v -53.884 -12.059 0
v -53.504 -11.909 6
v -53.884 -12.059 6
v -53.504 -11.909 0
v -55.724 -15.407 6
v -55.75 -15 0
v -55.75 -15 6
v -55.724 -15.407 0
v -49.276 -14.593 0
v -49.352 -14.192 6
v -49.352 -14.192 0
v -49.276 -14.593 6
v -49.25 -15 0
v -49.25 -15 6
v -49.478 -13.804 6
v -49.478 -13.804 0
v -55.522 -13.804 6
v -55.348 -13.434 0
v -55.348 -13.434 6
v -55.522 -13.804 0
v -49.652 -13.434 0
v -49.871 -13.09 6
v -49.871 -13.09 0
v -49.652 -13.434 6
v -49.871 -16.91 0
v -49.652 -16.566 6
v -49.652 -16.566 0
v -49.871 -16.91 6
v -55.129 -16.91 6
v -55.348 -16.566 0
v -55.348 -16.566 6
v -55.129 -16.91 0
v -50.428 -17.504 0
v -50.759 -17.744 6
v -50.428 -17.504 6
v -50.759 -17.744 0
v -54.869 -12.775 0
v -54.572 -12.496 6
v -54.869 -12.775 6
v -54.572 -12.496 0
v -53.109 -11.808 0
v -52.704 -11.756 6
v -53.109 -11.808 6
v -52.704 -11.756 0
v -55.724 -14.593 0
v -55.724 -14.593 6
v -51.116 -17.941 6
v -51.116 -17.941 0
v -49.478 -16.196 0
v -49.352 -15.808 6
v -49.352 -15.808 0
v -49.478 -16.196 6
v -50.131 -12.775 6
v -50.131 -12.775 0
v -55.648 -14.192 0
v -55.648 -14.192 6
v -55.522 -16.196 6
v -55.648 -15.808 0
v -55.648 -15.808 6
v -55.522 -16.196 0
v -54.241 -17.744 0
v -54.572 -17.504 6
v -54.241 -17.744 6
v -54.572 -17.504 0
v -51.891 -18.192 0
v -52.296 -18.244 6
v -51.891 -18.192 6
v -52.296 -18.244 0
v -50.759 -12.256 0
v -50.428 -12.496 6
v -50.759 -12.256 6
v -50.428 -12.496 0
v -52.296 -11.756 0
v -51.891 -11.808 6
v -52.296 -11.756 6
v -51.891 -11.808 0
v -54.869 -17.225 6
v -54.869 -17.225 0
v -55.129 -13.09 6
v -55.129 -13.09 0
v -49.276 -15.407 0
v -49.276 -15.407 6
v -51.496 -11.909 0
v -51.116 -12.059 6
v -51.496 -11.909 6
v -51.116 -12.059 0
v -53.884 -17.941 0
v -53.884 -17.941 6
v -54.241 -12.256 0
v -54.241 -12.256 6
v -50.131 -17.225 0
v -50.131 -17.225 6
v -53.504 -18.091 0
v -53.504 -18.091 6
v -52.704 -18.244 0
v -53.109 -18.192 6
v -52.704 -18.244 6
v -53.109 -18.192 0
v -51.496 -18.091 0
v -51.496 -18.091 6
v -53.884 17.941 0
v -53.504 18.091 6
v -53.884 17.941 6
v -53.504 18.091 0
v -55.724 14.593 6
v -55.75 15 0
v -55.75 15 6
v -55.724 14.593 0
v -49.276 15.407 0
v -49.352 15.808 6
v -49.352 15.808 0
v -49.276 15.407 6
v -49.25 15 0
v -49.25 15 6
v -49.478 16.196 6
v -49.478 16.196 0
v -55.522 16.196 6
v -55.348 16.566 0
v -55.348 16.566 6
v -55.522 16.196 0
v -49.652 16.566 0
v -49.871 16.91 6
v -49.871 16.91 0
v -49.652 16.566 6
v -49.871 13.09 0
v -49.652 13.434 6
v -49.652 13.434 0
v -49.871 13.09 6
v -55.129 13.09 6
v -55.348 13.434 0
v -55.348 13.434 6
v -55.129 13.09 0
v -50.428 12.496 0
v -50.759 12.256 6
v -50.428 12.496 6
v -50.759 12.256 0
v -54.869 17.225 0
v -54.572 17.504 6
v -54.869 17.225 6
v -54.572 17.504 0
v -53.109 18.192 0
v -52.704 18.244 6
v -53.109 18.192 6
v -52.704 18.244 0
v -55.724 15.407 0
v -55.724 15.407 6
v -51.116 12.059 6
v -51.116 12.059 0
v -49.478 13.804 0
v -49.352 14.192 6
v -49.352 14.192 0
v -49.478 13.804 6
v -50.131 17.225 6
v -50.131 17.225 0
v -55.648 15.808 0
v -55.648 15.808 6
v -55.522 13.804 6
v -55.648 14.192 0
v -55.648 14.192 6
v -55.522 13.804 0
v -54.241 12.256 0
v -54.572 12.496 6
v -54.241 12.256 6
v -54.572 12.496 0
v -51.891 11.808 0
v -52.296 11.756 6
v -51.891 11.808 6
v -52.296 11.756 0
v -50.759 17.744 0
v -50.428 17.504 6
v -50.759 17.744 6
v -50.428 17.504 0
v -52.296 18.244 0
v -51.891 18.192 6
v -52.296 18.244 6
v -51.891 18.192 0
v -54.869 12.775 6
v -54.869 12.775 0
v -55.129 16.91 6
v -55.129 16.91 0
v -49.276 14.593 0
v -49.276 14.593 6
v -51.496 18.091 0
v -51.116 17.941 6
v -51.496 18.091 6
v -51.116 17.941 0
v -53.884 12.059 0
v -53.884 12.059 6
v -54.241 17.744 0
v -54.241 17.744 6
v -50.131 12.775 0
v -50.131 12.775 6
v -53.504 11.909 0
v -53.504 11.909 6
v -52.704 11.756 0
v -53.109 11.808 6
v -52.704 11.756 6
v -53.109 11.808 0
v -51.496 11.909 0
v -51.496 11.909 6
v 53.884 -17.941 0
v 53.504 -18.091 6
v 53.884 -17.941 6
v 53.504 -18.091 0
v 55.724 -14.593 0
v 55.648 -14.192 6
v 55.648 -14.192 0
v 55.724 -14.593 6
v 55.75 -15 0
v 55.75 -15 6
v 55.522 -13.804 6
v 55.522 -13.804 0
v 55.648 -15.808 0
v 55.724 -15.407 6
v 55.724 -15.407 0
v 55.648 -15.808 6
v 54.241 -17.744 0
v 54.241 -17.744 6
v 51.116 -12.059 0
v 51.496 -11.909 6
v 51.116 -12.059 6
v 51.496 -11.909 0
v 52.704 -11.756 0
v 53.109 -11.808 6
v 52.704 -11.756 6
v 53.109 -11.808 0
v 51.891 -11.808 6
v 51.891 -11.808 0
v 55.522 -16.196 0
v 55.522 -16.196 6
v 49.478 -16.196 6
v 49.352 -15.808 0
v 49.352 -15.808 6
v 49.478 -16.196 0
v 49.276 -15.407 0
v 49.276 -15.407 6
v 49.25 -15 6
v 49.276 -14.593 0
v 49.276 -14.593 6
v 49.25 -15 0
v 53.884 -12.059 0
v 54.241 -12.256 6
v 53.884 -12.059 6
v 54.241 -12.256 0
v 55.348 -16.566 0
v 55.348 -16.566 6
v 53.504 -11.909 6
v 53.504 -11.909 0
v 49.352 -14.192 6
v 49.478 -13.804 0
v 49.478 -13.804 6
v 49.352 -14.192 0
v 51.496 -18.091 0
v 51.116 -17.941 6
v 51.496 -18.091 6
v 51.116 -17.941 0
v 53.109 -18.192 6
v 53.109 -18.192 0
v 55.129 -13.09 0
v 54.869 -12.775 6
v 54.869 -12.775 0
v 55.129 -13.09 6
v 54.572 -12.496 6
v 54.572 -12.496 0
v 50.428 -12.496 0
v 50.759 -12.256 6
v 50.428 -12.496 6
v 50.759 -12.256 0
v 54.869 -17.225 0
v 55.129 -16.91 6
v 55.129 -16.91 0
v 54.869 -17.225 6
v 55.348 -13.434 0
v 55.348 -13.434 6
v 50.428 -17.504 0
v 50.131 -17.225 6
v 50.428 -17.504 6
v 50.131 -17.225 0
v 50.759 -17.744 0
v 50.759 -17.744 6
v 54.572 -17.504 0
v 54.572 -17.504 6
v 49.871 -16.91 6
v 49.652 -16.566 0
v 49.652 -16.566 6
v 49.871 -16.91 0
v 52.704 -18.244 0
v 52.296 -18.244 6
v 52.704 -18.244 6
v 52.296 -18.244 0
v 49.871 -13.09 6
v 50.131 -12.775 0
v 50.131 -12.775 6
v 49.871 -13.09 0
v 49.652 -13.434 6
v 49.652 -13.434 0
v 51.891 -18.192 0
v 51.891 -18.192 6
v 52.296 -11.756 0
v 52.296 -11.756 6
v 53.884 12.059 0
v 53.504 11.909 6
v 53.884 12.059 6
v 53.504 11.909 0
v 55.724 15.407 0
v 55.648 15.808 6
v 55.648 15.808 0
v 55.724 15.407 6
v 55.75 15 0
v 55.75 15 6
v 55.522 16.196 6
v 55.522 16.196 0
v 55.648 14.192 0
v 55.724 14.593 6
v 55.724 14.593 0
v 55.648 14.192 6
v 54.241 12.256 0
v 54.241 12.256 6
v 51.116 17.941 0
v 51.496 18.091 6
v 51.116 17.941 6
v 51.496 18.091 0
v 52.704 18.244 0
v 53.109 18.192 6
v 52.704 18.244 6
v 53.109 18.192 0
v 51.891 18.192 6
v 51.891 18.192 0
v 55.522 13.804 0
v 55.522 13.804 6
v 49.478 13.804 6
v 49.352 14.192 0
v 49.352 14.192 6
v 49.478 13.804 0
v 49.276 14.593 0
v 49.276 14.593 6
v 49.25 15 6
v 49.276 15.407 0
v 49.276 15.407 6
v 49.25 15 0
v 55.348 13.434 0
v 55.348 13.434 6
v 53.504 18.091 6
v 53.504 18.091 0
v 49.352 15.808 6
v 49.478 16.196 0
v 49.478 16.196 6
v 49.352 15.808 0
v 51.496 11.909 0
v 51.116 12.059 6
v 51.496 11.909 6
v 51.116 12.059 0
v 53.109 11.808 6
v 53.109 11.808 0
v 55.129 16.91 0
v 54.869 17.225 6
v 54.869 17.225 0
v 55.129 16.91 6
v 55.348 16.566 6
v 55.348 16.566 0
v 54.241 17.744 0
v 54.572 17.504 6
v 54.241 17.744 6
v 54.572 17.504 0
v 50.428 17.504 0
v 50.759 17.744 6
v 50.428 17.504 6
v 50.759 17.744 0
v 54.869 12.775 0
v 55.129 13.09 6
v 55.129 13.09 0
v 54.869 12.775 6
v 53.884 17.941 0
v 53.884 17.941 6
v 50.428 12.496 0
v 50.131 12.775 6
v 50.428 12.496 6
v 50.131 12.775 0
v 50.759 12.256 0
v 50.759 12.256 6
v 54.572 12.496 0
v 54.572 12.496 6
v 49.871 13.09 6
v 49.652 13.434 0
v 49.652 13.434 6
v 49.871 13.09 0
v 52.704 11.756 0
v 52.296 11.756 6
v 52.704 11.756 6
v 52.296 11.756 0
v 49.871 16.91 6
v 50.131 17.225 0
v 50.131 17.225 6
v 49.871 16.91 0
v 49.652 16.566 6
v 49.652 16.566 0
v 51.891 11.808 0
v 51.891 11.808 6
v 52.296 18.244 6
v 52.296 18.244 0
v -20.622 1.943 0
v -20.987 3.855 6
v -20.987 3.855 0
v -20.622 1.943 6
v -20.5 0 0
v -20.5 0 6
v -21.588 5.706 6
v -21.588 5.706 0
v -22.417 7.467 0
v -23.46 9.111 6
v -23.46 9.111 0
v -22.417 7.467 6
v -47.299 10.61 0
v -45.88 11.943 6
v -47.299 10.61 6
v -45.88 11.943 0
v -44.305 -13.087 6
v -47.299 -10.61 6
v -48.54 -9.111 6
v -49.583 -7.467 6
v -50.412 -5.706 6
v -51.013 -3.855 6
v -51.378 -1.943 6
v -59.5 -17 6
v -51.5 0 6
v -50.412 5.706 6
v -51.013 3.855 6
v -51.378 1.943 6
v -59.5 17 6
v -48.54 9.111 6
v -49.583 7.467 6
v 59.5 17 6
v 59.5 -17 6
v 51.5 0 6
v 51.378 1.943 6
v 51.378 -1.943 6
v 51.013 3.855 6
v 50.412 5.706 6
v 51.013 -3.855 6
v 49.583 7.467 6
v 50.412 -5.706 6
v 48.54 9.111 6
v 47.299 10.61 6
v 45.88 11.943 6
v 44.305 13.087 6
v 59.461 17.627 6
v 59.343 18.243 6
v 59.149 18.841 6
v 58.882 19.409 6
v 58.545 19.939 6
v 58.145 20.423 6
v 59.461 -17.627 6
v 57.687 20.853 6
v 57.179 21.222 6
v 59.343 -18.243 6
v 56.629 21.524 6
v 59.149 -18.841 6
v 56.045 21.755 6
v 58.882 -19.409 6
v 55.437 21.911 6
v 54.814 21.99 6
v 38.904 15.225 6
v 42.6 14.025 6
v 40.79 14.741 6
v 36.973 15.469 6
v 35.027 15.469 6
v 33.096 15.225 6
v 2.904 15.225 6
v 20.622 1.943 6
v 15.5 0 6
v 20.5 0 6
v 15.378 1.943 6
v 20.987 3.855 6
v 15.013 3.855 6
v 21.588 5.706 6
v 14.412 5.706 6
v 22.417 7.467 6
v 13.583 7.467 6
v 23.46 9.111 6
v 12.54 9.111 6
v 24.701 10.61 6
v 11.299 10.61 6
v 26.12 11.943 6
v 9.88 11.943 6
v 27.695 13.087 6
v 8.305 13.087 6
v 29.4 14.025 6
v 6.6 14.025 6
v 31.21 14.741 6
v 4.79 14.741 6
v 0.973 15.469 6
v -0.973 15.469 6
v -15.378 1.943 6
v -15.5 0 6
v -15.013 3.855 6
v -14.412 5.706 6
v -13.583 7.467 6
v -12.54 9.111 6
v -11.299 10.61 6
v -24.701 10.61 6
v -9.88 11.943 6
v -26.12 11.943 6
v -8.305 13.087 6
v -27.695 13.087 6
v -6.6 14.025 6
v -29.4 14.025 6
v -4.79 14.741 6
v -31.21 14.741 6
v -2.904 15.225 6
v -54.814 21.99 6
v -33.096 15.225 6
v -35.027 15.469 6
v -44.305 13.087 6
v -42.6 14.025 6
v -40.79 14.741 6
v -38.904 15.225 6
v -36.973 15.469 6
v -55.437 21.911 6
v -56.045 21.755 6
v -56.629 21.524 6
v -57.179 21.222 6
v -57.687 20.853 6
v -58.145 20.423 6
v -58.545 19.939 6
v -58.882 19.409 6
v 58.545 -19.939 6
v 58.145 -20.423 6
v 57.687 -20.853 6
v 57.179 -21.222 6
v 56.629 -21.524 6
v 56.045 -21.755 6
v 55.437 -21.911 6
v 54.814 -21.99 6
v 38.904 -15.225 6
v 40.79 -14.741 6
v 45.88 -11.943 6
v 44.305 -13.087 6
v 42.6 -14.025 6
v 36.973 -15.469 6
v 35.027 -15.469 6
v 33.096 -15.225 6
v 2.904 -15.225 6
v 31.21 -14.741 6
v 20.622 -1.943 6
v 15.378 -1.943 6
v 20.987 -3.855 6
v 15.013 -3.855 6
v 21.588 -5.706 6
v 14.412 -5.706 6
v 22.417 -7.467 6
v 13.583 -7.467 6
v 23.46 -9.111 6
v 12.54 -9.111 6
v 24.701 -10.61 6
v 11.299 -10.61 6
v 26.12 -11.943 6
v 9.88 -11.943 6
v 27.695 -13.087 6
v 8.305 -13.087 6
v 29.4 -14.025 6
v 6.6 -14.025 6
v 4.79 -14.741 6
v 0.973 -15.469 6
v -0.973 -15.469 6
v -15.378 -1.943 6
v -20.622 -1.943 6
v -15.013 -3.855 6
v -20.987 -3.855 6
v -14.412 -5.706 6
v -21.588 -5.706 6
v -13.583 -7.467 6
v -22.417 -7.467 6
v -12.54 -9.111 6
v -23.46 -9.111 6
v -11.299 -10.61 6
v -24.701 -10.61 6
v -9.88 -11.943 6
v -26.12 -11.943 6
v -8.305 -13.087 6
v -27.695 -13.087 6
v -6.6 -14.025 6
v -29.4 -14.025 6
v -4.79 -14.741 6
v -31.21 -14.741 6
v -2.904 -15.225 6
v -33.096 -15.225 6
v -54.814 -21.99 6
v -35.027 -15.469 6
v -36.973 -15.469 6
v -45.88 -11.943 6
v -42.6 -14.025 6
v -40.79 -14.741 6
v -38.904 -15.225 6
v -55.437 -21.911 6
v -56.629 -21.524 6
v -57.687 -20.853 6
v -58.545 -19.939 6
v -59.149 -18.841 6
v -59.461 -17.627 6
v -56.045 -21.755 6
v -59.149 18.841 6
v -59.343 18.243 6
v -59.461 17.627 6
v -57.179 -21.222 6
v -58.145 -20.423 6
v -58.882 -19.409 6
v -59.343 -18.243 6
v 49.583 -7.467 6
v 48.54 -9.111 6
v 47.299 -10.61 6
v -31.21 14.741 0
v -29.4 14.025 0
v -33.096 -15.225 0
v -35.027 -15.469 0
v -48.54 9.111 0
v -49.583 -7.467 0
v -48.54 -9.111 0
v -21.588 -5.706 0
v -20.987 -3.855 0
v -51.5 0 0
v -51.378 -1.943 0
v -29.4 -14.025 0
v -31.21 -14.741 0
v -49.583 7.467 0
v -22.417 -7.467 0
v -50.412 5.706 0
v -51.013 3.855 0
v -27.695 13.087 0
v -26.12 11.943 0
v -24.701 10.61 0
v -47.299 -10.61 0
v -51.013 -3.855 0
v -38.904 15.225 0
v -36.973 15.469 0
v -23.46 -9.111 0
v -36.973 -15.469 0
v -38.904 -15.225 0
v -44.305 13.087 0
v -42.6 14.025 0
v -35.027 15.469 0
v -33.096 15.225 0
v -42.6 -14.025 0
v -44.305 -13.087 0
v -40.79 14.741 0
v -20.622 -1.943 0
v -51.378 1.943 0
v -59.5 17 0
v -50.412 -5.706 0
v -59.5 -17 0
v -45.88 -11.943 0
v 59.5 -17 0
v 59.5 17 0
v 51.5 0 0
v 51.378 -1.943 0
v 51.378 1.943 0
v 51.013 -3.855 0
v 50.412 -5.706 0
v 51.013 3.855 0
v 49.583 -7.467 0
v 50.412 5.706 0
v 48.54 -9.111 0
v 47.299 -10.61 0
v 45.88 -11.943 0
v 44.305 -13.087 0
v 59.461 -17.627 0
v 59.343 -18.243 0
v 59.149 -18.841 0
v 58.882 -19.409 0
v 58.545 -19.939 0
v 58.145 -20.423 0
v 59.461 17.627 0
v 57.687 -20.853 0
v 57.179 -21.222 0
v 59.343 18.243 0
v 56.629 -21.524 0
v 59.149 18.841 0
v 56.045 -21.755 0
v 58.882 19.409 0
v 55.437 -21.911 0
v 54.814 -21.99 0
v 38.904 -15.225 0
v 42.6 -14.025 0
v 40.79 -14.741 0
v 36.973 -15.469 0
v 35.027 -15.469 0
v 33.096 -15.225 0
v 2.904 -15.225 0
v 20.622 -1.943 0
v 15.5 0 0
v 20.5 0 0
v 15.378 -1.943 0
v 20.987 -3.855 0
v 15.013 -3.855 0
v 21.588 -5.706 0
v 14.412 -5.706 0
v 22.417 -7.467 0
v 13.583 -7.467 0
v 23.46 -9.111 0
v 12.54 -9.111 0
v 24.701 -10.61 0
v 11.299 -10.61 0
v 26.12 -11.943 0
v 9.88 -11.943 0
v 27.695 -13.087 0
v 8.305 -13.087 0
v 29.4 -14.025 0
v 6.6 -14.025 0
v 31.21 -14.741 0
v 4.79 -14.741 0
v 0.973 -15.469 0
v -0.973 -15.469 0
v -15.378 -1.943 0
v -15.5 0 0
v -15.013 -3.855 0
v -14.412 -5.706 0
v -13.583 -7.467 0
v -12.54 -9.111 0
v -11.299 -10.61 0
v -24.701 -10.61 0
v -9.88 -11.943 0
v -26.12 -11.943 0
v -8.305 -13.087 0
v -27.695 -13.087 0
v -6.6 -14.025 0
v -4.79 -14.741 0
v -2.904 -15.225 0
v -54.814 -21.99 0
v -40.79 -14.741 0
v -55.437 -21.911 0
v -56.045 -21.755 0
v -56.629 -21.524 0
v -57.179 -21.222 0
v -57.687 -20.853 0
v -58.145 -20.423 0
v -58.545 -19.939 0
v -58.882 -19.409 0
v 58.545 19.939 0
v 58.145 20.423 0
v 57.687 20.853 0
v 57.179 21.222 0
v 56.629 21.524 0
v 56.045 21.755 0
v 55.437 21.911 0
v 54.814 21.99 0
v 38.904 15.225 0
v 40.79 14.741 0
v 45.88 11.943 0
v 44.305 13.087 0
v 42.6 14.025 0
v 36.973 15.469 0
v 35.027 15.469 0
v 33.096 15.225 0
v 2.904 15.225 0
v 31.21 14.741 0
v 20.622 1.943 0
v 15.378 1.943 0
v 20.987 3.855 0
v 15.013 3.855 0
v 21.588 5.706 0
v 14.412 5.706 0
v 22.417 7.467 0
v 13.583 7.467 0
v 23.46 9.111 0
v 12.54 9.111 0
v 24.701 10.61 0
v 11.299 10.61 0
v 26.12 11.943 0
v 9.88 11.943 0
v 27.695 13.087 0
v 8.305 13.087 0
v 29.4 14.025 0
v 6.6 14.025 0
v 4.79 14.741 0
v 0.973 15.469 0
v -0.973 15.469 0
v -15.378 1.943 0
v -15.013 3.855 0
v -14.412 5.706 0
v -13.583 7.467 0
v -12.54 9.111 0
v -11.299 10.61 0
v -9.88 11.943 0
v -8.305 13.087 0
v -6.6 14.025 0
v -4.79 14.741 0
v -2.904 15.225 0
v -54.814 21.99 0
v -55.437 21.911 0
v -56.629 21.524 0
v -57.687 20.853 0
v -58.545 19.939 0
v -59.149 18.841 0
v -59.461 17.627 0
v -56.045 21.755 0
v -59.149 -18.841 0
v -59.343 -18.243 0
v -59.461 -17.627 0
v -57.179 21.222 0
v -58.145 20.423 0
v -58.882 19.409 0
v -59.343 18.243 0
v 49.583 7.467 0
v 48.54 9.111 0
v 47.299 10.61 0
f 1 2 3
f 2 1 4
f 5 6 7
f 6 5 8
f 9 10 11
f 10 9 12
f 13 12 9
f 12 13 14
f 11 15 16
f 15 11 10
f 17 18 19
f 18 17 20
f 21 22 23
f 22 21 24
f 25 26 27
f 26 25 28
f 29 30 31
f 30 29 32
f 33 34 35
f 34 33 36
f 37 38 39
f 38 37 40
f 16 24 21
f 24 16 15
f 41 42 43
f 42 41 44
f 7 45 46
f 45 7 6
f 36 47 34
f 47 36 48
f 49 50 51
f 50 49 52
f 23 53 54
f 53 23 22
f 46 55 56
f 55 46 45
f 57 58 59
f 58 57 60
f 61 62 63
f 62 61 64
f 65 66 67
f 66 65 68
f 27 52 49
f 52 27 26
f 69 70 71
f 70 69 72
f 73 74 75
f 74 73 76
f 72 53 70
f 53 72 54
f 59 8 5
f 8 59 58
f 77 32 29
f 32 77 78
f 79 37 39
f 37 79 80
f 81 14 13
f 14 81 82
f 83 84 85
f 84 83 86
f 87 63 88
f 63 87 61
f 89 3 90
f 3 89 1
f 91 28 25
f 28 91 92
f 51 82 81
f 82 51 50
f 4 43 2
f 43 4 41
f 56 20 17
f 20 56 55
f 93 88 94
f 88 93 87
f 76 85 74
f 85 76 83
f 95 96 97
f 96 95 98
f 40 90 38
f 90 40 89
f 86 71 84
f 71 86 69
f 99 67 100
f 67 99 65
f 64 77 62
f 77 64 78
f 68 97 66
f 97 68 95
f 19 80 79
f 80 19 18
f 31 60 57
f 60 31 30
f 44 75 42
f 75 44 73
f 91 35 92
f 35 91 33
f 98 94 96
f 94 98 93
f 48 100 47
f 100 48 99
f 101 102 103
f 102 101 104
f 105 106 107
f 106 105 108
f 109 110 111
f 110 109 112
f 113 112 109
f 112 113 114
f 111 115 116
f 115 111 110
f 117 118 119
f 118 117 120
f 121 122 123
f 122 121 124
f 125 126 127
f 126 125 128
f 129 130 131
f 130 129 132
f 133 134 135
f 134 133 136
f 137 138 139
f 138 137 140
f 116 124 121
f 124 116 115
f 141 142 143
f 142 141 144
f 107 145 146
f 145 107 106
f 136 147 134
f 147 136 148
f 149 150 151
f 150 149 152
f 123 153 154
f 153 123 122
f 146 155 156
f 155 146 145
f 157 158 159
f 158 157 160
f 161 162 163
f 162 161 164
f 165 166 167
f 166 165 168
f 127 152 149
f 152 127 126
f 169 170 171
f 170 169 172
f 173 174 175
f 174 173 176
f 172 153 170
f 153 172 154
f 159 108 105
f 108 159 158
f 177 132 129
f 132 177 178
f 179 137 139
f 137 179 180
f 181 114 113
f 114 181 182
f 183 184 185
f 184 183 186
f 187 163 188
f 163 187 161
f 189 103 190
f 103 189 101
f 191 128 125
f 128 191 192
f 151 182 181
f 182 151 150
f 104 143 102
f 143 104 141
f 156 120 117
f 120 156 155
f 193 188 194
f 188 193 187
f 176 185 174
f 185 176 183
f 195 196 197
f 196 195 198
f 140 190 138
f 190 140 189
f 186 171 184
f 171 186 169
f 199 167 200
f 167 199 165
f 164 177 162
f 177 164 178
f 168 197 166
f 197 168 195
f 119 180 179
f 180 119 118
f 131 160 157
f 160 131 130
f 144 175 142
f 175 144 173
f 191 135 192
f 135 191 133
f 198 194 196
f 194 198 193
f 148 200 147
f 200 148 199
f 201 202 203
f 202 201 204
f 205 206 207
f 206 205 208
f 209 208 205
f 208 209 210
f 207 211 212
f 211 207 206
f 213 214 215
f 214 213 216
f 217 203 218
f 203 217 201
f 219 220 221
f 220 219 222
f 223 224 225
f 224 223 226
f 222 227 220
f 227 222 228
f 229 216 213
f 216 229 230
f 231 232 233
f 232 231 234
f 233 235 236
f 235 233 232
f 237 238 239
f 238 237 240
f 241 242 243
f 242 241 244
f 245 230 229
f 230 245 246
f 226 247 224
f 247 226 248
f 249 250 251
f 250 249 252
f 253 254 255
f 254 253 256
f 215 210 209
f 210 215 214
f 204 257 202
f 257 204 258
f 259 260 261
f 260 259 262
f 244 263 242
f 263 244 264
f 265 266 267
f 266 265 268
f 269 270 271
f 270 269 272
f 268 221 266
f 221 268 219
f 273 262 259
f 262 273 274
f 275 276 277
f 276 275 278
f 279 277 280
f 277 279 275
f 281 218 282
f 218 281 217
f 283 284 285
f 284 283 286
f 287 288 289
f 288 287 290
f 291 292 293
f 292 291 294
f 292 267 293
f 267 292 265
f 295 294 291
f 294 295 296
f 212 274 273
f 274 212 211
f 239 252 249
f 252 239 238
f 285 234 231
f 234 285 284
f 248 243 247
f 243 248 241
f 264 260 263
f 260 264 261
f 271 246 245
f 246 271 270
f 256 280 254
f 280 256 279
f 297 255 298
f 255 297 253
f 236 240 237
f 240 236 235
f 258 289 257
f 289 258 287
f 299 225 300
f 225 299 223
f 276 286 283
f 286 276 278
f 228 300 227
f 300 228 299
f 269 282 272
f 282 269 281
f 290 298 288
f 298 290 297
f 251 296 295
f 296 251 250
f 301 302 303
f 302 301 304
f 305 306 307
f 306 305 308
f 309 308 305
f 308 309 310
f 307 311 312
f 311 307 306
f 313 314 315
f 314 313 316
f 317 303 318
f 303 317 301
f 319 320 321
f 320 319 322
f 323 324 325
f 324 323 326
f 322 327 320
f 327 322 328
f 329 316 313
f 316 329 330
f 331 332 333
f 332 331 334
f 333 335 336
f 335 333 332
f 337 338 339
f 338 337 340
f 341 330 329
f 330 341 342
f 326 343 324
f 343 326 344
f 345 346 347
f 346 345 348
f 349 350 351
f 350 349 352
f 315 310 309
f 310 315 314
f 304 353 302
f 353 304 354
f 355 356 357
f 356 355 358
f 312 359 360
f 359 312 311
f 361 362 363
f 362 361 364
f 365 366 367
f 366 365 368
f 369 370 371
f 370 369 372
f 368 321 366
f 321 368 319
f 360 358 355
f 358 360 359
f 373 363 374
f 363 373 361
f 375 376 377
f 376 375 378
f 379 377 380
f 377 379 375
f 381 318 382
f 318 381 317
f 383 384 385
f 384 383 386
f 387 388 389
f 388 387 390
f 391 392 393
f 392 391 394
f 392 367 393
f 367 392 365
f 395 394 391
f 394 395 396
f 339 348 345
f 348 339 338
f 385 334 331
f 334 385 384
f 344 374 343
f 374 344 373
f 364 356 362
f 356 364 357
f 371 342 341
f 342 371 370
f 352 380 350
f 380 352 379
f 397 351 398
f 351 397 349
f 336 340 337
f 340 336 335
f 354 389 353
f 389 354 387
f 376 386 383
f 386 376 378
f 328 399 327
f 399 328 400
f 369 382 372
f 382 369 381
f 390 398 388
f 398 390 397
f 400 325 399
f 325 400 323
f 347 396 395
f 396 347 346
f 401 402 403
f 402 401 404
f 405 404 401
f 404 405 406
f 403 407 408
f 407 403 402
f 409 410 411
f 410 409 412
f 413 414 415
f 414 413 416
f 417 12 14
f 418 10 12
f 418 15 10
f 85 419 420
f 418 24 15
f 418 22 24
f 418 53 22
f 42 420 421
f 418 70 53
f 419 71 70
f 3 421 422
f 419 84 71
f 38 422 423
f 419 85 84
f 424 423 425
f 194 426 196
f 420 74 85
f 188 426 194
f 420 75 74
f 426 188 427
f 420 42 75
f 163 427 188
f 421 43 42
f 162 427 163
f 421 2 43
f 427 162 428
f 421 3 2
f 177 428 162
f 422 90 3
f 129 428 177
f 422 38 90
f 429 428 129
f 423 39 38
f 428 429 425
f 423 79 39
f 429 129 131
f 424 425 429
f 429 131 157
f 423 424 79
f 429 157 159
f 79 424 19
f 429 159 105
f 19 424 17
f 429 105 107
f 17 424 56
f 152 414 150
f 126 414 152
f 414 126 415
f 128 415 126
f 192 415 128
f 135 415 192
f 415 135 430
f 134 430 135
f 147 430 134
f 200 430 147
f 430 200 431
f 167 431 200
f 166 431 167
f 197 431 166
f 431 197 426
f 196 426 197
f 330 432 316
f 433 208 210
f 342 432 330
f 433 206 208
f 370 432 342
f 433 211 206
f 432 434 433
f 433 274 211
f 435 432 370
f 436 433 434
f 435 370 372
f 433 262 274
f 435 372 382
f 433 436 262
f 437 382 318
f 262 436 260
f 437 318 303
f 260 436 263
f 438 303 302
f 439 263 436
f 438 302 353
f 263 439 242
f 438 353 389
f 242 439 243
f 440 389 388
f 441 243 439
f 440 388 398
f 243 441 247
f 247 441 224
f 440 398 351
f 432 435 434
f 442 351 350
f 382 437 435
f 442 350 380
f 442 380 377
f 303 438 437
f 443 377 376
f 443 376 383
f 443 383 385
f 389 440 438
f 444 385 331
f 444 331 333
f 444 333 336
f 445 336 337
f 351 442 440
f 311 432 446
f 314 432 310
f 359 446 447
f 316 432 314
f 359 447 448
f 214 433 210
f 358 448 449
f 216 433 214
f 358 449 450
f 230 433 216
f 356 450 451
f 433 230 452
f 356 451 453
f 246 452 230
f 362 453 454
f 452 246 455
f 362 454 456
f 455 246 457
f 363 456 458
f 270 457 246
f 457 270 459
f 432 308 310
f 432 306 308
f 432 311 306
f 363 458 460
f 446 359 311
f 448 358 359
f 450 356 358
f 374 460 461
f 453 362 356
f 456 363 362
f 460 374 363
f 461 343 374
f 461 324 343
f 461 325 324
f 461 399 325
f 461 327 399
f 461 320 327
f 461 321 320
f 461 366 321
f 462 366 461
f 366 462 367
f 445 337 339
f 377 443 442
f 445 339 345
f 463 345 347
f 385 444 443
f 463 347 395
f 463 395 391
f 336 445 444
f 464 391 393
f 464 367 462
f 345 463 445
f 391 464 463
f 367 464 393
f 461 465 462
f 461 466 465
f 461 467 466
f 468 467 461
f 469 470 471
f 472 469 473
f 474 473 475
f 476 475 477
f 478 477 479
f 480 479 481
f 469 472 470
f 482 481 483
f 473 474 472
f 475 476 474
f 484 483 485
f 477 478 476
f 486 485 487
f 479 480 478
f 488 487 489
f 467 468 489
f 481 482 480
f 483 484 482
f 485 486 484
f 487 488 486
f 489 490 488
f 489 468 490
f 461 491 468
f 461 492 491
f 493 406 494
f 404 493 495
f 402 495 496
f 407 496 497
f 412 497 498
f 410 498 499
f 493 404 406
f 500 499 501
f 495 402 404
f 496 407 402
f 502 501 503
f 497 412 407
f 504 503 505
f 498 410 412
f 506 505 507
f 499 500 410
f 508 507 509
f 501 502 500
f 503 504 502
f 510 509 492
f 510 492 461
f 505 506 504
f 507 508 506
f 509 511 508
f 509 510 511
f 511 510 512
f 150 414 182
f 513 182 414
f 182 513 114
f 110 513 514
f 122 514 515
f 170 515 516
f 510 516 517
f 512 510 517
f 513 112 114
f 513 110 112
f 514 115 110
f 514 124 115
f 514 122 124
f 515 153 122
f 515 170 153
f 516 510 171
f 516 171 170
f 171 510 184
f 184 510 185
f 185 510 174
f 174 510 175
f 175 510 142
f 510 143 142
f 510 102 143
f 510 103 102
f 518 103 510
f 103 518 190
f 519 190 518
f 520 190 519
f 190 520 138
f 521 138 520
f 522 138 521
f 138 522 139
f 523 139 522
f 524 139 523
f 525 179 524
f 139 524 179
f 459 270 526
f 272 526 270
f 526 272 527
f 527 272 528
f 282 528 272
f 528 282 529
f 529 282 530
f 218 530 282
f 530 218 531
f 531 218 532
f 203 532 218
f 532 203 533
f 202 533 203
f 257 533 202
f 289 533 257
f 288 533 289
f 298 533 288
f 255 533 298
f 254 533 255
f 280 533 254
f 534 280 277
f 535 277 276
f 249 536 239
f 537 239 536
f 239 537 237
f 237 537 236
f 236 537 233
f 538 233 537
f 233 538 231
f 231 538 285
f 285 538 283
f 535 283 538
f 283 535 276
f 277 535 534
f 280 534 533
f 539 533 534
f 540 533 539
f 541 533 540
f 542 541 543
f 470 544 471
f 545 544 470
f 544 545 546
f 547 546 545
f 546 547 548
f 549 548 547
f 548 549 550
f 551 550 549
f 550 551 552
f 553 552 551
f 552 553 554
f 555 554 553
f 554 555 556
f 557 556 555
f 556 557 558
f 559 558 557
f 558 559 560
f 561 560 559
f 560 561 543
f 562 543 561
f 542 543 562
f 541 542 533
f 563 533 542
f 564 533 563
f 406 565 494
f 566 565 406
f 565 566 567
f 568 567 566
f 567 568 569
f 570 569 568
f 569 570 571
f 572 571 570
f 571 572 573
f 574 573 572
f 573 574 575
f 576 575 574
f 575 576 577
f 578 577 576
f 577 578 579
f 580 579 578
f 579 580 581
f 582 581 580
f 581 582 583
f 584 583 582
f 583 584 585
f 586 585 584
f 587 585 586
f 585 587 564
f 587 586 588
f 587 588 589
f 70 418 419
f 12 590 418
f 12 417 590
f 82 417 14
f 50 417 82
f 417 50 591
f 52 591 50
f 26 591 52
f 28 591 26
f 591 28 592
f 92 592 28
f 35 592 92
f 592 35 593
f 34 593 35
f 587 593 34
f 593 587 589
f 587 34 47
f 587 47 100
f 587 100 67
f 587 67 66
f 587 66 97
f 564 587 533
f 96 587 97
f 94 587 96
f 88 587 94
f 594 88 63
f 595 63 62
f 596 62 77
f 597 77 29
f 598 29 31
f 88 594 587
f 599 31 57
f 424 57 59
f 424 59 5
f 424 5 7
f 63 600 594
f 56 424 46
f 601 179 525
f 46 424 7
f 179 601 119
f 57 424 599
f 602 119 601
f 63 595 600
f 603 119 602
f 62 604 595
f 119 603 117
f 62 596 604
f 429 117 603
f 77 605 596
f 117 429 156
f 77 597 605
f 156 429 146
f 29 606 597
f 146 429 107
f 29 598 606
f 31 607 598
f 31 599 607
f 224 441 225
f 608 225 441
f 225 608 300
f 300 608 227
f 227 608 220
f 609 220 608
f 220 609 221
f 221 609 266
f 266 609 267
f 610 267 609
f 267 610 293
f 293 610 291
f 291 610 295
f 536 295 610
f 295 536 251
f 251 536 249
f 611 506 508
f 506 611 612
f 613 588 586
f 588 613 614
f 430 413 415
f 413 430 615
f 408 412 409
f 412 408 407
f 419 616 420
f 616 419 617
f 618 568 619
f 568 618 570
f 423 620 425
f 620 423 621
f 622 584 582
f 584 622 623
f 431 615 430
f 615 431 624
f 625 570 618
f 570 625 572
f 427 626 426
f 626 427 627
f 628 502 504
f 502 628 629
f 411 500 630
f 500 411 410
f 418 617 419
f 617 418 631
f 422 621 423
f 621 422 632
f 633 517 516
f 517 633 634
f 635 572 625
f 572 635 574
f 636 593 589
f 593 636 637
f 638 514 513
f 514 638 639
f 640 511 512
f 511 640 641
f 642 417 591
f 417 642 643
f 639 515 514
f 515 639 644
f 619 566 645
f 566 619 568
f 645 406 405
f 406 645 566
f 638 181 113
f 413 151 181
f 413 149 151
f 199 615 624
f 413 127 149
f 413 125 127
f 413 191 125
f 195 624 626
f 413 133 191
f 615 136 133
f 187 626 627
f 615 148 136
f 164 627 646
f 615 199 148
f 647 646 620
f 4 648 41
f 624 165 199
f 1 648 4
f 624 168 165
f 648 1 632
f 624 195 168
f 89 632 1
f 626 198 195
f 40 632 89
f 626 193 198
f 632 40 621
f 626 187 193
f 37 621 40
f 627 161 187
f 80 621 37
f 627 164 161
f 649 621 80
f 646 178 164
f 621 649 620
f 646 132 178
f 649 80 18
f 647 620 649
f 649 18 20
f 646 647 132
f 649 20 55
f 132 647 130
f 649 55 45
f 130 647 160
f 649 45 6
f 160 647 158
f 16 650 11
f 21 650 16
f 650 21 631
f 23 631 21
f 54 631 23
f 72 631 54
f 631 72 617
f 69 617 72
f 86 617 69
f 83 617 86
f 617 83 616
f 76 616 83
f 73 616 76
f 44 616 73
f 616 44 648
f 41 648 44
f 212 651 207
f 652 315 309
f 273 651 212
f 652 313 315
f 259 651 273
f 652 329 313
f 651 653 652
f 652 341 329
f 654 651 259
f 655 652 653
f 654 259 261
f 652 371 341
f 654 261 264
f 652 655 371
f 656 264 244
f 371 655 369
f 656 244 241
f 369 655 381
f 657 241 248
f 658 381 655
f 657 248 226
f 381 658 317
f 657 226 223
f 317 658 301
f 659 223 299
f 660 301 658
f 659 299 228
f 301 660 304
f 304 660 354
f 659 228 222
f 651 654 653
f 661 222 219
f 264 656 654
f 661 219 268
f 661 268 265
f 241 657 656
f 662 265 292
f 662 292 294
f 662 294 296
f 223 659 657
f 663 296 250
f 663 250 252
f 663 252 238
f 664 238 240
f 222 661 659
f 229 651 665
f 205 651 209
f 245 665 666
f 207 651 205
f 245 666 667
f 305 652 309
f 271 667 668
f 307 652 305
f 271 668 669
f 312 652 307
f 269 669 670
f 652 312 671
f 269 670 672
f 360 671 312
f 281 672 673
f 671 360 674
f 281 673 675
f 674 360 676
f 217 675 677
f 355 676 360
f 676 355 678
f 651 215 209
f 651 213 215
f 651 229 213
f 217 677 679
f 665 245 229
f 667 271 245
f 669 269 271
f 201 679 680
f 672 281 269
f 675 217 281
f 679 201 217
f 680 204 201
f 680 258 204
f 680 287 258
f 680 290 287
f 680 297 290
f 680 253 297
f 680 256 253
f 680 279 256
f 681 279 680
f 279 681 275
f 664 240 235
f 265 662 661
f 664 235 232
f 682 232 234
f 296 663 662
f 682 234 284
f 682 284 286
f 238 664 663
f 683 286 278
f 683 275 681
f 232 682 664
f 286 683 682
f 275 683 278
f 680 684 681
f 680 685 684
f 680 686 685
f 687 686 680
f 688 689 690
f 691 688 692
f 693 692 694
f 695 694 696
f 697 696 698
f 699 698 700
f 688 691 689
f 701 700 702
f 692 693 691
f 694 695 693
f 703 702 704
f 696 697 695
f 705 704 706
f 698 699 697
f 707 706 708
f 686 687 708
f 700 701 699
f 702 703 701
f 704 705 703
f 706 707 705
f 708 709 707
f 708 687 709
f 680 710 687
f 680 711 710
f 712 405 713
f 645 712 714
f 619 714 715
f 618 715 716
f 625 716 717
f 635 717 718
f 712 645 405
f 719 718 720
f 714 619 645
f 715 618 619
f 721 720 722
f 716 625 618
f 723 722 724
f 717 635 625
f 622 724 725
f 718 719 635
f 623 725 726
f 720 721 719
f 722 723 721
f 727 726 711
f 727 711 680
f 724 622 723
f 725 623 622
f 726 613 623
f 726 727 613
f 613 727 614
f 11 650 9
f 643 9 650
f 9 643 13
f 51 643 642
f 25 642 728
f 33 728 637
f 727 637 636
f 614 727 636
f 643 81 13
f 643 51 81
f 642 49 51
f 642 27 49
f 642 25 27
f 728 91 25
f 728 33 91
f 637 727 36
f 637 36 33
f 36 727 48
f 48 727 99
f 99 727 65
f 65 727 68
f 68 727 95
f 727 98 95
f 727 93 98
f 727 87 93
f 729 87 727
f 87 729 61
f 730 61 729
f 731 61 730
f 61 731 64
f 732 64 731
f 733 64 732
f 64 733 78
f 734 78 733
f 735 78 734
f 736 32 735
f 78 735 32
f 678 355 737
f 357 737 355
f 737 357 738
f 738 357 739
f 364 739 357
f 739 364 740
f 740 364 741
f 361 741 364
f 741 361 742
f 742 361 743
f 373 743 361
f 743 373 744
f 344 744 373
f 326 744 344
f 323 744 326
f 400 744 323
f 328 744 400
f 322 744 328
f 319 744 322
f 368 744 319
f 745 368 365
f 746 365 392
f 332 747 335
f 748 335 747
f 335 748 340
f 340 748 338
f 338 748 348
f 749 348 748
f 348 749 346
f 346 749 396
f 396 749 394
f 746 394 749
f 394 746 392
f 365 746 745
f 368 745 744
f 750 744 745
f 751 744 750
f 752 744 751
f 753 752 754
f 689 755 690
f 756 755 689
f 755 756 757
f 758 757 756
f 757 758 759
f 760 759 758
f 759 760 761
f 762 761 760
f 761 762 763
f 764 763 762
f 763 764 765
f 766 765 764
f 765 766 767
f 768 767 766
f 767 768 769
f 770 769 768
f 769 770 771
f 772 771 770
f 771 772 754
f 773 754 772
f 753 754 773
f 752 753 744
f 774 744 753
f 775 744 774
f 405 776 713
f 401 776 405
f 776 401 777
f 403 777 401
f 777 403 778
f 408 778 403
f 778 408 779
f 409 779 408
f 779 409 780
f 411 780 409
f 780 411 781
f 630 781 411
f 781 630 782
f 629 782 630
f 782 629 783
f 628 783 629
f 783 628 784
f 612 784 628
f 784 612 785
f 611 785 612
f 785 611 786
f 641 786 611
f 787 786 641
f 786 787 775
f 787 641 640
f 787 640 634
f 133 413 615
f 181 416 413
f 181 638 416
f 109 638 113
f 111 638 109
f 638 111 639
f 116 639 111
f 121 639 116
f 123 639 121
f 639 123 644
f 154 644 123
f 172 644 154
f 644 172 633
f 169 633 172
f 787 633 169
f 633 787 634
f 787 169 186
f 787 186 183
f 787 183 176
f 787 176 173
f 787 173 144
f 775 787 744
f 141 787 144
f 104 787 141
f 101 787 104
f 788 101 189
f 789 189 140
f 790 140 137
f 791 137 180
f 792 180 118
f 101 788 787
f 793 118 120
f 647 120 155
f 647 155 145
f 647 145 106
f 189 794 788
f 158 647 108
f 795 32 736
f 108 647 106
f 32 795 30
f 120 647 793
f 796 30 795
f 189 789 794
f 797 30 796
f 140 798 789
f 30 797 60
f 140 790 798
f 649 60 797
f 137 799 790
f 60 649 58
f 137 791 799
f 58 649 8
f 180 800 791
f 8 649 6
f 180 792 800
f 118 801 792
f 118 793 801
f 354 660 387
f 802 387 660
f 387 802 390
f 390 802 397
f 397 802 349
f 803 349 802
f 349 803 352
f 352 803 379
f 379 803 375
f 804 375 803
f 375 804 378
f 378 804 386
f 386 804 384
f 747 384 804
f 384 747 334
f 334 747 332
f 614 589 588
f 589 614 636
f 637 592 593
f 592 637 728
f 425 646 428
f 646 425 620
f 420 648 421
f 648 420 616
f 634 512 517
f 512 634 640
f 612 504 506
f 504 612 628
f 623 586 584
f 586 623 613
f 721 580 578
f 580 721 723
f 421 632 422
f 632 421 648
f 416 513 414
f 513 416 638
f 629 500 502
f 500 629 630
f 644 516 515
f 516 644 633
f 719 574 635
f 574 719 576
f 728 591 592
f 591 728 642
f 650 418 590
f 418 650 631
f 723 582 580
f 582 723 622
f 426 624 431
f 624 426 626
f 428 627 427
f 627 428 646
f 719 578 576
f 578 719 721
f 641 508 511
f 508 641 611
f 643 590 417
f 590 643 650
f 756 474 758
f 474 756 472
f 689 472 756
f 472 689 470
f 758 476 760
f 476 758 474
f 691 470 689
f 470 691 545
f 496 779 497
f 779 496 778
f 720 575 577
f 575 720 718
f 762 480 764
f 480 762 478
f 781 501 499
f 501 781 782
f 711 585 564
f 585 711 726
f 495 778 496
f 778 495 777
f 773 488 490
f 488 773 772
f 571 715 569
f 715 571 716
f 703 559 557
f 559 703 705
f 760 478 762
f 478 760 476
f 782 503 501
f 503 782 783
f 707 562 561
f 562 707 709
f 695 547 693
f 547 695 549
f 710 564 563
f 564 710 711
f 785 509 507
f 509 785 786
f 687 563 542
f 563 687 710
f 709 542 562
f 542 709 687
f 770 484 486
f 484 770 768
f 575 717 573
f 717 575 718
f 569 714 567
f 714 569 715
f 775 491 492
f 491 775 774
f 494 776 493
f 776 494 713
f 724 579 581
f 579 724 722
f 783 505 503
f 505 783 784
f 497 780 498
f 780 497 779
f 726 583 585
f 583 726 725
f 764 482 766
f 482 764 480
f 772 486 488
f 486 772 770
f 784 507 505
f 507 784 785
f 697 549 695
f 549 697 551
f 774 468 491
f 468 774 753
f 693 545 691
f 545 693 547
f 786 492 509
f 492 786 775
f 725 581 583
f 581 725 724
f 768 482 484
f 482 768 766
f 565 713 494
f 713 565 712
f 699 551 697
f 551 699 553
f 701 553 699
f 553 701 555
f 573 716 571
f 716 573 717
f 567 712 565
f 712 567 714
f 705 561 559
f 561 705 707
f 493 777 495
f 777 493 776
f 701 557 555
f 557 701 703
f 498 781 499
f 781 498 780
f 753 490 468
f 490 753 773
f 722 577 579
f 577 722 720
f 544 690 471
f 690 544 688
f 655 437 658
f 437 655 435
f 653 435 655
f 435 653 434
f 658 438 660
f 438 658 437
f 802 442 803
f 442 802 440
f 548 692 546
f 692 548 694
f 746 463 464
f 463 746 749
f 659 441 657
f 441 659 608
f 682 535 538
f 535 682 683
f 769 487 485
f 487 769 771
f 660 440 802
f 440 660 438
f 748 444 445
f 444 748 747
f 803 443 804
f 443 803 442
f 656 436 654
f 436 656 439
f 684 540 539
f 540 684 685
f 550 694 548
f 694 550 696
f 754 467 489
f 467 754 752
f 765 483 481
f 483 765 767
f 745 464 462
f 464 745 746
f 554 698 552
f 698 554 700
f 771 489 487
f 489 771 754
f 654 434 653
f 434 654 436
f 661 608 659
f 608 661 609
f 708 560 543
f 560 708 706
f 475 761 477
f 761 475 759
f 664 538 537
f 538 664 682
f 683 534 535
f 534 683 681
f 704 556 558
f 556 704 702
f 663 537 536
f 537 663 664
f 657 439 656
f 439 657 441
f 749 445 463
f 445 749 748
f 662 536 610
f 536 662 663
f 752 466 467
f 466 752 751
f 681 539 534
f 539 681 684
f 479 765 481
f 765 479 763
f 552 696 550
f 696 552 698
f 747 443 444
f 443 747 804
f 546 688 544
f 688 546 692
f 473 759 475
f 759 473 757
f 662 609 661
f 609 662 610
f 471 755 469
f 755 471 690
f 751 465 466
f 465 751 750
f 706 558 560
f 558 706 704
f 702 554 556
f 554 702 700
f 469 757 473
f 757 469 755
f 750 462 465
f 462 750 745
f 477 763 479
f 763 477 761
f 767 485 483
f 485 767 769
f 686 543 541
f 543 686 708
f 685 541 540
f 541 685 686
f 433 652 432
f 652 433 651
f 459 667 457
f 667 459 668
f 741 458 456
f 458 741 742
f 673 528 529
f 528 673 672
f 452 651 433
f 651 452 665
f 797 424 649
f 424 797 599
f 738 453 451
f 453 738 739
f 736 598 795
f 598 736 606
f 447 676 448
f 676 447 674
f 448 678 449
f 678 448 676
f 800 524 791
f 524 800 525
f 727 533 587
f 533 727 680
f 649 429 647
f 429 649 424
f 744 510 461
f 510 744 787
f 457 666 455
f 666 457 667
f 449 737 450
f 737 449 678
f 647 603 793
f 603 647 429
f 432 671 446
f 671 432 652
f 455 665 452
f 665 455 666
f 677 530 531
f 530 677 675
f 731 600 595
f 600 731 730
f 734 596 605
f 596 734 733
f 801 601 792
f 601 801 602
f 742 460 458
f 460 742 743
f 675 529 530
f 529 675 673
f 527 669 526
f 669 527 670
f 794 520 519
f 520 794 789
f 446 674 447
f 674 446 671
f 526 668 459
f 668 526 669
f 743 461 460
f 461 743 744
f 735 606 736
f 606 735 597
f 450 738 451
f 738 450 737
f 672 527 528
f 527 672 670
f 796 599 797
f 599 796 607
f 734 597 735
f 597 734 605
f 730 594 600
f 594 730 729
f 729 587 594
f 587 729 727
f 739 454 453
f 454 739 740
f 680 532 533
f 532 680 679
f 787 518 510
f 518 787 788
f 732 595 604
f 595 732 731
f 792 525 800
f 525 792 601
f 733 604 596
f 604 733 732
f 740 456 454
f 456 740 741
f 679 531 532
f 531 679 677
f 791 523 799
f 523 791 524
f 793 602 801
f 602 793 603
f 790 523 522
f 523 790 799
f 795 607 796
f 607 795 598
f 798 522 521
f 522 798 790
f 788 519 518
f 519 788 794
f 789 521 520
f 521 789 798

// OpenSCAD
$fn = 50;


difference() {
	union() {
		hull() {
			translate(v = [-54.5000000000, 17.0000000000, 0]) {
				cylinder(h = 6, r = 5);
			}
			translate(v = [54.5000000000, 17.0000000000, 0]) {
				cylinder(h = 6, r = 5);
			}
			translate(v = [-54.5000000000, -17.0000000000, 0]) {
				cylinder(h = 6, r = 5);
			}
			translate(v = [54.5000000000, -17.0000000000, 0]) {
				cylinder(h = 6, r = 5);
			}
		}
	}
	union() {
		#translate(v = [-52.5000000000, -15.0000000000, -100.0000000000]) {
			cylinder(h = 200, r = 3.2500000000);
		}
		#translate(v = [-52.5000000000, 15.0000000000, -100.0000000000]) {
			cylinder(h = 200, r = 3.2500000000);
		}
		#translate(v = [52.5000000000, -15.0000000000, -100.0000000000]) {
			cylinder(h = 200, r = 3.2500000000);
		}
		#translate(v = [52.5000000000, 15.0000000000, -100.0000000000]) {
			cylinder(h = 200, r = 3.2500000000);
		}
		#translate(v = [-36.0000000000, 0, 0]) {
			cylinder(h = 6, r = 15.5000000000);
		}
		#cylinder(h = 6, r = 15.5000000000);
		#translate(v = [36.0000000000, 0, 0]) {
			cylinder(h = 6, r = 15.5000000000);
		}
	}
}
